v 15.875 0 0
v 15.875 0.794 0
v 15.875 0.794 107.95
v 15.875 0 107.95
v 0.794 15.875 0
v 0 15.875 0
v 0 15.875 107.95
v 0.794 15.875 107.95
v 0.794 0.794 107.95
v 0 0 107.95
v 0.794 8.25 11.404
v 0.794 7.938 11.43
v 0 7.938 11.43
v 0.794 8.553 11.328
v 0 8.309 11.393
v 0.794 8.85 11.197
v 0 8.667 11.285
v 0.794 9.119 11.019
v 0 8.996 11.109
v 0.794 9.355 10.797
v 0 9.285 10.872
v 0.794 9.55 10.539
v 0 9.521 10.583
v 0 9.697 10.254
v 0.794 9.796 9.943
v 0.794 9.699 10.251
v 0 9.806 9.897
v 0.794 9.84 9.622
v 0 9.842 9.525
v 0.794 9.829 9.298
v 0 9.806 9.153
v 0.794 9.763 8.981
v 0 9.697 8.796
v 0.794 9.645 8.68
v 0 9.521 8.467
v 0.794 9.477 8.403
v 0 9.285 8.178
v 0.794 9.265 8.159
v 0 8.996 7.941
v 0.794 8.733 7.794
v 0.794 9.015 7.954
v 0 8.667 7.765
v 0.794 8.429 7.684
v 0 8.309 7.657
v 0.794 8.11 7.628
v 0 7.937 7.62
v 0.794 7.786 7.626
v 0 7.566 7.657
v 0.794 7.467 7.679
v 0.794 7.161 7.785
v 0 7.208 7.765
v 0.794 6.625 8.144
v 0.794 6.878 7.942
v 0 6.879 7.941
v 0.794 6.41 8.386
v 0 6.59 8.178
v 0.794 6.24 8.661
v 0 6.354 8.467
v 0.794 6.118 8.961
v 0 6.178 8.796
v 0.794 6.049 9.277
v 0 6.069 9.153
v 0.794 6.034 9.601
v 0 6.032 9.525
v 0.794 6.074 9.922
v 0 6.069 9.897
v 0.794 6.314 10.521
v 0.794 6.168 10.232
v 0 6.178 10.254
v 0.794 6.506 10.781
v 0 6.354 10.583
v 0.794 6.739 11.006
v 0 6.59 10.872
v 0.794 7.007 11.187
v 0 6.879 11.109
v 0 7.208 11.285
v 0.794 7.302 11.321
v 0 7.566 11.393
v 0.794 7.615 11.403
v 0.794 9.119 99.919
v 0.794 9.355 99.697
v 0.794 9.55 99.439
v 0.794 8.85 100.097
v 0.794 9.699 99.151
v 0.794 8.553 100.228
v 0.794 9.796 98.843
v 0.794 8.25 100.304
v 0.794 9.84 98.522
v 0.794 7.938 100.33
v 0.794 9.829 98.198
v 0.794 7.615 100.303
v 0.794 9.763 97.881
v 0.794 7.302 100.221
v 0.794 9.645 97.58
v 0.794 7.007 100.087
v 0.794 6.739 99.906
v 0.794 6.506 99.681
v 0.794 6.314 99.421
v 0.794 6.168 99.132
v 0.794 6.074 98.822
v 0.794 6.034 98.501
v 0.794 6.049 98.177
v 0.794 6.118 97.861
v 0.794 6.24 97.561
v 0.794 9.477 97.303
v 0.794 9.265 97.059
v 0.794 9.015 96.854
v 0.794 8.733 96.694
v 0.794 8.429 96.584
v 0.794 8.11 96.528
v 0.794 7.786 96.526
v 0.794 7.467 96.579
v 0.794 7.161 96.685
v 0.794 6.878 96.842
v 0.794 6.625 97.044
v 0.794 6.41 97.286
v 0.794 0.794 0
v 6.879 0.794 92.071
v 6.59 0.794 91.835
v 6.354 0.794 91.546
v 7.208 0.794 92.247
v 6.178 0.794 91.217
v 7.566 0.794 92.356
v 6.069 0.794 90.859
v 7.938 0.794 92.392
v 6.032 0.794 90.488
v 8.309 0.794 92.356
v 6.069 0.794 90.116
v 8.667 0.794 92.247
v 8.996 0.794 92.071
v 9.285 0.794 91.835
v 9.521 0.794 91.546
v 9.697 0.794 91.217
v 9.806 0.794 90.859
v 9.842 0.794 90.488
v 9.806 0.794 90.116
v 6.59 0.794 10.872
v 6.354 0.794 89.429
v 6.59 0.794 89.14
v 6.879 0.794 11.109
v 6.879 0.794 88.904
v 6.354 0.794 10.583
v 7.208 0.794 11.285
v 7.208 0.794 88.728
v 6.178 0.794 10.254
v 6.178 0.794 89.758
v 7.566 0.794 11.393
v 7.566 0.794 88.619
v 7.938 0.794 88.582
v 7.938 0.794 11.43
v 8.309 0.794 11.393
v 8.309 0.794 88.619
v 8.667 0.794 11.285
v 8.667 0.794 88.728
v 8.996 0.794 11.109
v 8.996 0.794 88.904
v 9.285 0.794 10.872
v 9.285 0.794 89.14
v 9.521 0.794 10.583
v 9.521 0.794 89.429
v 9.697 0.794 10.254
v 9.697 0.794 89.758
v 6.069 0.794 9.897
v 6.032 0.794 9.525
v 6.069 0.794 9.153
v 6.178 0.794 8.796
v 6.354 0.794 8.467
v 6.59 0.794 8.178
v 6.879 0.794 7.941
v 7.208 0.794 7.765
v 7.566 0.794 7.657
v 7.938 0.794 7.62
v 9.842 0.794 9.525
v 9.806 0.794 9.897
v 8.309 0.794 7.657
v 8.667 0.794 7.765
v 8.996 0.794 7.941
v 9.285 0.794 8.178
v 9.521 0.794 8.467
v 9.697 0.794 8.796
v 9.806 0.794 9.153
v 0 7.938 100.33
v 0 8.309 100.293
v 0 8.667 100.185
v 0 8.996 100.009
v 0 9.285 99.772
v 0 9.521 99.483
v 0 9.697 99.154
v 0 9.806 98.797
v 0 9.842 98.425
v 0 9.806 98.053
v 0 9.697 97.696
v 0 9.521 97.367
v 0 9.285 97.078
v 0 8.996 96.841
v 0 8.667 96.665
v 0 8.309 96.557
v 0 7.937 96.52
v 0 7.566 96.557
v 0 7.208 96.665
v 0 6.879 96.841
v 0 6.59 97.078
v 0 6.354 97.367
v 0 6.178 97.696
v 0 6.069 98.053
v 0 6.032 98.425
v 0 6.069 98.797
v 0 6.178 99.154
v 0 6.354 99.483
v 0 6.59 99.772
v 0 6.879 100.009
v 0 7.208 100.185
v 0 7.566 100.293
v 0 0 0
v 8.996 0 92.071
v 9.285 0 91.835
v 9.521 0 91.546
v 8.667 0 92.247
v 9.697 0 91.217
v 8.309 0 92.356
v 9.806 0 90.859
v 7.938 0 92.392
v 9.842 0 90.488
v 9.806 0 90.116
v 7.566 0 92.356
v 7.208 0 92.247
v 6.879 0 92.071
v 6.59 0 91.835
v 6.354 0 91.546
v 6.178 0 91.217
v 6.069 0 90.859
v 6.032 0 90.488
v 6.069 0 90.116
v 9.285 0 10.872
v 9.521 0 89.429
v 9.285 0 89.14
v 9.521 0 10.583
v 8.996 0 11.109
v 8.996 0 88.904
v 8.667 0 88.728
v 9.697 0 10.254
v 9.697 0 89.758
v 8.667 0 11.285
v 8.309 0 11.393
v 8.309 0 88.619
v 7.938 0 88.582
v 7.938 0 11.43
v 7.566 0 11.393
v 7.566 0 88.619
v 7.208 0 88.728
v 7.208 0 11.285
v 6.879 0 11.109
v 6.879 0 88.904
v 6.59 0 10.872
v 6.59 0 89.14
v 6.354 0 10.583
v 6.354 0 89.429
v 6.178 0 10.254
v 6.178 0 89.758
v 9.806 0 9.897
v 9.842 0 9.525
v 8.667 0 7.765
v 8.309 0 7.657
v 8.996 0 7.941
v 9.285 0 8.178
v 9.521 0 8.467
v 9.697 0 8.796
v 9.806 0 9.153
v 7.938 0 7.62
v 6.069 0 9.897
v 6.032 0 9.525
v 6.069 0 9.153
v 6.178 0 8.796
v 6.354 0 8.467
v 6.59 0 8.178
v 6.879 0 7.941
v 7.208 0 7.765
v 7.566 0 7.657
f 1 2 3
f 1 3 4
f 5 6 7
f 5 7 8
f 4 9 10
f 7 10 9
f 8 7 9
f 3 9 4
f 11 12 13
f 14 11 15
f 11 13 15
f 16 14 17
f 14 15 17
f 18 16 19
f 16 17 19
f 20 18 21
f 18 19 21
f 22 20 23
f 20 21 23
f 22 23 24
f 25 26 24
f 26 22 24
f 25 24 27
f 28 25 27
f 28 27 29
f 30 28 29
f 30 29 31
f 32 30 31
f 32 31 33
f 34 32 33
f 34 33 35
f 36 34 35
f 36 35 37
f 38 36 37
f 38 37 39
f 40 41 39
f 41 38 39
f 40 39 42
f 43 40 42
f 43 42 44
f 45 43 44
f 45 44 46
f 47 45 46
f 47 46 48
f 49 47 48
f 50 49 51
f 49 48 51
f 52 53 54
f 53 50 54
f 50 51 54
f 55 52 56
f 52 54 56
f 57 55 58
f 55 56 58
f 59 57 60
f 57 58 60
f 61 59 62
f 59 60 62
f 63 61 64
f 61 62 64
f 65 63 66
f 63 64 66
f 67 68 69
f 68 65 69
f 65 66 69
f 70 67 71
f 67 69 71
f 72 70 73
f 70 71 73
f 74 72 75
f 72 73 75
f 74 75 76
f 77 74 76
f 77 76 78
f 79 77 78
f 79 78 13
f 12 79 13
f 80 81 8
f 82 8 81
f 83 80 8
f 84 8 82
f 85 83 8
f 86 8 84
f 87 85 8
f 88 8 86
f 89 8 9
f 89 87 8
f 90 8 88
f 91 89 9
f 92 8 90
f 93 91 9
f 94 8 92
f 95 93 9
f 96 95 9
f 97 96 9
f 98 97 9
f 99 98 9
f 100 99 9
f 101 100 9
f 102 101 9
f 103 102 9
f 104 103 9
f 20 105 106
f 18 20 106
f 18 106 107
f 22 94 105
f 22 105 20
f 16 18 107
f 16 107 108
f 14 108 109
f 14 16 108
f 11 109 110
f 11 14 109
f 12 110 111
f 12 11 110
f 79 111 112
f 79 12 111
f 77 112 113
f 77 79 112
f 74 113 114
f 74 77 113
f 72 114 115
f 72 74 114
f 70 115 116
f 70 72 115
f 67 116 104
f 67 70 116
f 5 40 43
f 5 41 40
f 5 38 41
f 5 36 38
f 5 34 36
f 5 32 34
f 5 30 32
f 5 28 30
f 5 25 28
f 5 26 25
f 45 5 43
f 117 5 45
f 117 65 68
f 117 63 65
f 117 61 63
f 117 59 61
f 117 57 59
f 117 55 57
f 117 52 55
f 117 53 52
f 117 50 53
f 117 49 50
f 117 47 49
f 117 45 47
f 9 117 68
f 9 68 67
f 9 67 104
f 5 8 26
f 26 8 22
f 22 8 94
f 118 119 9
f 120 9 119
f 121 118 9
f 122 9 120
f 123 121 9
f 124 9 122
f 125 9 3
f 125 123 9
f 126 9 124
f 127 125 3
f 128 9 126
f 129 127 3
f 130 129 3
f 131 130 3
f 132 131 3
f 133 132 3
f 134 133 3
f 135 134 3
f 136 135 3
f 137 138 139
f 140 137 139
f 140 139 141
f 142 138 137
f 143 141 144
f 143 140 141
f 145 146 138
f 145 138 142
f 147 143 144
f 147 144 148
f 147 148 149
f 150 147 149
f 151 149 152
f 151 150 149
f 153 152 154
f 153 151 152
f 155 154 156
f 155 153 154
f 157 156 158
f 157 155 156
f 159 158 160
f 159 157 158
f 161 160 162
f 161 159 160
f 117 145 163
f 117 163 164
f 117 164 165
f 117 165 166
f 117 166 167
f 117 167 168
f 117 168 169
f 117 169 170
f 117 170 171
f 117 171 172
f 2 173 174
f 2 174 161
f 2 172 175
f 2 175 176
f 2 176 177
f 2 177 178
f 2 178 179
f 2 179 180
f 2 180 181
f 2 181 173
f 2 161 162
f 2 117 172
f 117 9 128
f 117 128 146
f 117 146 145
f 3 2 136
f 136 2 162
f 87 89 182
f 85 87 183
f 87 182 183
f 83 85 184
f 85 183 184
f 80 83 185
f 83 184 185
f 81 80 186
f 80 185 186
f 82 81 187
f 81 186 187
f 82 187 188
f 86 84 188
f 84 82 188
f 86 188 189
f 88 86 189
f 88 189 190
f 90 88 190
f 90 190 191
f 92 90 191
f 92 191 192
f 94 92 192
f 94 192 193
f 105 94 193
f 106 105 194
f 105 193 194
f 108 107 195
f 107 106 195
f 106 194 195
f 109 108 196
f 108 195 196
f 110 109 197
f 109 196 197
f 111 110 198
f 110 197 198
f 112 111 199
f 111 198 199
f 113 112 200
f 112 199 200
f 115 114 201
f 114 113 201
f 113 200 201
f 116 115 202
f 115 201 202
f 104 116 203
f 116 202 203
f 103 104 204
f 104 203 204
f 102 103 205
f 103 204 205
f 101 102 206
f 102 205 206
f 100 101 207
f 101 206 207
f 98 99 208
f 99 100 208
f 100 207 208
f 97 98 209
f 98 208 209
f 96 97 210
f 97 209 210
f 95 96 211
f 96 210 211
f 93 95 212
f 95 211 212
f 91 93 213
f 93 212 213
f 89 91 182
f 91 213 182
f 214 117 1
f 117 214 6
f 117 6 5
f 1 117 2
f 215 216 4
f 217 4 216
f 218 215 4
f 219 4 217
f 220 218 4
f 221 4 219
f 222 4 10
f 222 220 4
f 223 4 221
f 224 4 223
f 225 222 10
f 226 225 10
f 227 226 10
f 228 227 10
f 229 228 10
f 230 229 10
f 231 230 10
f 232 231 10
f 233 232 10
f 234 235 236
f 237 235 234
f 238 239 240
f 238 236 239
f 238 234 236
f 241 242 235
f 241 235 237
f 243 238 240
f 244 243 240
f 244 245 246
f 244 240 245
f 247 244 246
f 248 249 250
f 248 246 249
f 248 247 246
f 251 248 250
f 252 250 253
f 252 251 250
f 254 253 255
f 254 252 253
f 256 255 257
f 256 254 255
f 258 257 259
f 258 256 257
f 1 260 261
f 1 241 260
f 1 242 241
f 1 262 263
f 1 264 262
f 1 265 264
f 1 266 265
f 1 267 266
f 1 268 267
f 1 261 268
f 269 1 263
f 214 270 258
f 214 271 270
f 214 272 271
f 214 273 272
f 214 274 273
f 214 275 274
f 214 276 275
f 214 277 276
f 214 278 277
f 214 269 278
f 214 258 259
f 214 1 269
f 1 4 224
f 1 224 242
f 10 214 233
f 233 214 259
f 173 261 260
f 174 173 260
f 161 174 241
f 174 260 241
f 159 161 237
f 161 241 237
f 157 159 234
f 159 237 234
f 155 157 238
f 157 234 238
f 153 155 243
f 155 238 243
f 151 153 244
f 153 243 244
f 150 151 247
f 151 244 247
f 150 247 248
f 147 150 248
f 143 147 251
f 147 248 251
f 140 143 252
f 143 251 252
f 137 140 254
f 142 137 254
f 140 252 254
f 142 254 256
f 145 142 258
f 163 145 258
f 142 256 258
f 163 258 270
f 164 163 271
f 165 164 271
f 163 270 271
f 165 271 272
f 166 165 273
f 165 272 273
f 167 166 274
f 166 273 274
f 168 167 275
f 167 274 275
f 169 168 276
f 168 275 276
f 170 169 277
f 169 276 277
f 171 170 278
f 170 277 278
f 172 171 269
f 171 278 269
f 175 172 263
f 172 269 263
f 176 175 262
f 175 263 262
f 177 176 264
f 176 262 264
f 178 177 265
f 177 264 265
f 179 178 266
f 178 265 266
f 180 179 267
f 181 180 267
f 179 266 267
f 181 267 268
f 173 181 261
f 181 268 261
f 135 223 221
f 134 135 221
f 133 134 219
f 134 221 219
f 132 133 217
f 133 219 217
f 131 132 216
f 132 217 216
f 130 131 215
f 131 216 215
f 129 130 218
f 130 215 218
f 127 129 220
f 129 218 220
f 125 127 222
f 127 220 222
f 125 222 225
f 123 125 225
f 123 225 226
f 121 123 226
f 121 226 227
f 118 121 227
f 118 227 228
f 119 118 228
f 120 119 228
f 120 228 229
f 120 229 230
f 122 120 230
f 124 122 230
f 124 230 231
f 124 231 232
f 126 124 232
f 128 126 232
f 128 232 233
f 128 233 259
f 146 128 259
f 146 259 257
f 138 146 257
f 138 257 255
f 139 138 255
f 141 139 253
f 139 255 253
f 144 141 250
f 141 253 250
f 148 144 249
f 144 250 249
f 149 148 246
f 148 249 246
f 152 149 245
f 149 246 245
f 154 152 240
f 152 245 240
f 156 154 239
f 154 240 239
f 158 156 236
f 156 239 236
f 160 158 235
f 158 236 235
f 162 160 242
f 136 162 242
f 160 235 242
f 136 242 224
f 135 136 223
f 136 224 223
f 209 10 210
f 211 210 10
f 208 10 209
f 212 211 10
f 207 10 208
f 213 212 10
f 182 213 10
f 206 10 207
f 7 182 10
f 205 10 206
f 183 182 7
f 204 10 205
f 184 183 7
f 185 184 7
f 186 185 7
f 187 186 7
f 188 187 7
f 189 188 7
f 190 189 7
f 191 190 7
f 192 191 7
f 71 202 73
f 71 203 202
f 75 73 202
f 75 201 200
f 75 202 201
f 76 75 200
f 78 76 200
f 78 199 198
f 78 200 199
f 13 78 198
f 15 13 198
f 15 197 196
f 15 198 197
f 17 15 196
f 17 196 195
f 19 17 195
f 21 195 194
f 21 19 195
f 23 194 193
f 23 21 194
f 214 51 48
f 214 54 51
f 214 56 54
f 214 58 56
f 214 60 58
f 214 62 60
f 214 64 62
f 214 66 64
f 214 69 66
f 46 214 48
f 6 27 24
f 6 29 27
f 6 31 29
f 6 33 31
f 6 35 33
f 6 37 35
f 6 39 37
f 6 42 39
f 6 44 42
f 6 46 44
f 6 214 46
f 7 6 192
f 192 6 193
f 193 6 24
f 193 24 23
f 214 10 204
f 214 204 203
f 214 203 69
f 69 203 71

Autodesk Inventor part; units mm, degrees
ref_plane "YZ Plane" through (0, 0, 0) normal (1, 0, 0) x (0, 1, 0)
ref_plane "XZ Plane" through (0, 0, 0) normal (0, 1, 0) x (-1, 0, 0)
ref_plane "XY Plane" through (0, 0, 0) normal (0, 0, 1) x (1, 0, 0)
sketch "Sketch1" plane through (0, 0, 0) normal (0, 0, 1) x (1, 0, 0)
  line L0 (0, 0) -> (0, 15.875)
  line L1 (0, 15.875) -> (0.7937, 15.875)
  line L2 (0.7937, 15.875) -> (0.7938, 0.7937)
  line L3 (0.7938, 0.7937) -> (15.875, 0.7937)
  line L4 (15.875, 0.7937) -> (15.875, 0)
  line L5 (15.875, 0) -> (0, 0)
  dimension "d0" = 15.875
  dimension "d1" = 0.7937
extrude "Extrusion1" add sketch "Sketch1" along normal blind 107.95
sketch "Sketch2" plane through (0, 0, 0) normal (0, -1, 0) x (1, 0, 0)
  line L0 (15.875, 0) -> (0, 0) projected
  line L1 (0, 107.95) -> (15.875, 107.95) projected
  line L2 (7.9375, 107.95) -> (7.9375, 0) construction
  circle A0 centre (7.9375, 90.4875) radius 1.905
  circle A1 centre (7.9375, 9.525) radius 1.905
  line L3 (257.175, 98.425) -> (-9.525, 98.425) construction
  line L4 (-15.875, 82.55) -> (187.325, 82.55) construction
  dimension "d4" = 3.81
  dimension "d6" = 17.4625
  dimension "d7" = 9.525
  dimension "d16" = 15.875
  dimension "d17" = 9.525
extrude "Extrusion2" cut sketch "Sketch2" against normal through all
sketch "Sketch3" plane through (0, 0, 0) normal (-1, 0, 0) x (0, 0, 1)
  line L0 (0, 0) -> (0, 15.875) projected
  line L1 (107.95, 15.875) -> (107.95, 0) projected
  line L2 (0, 7.9375) -> (107.95, 7.9375) construction
  circle A0 centre (9.525, 7.9375) radius 1.905
  circle A1 centre (98.425, 7.9375) radius 1.905
  dimension "d11" = 3.81
  dimension "d12" = 9.525
  dimension "d13" = 9.525
extrude "Extrusion3" cut sketch "Sketch3" against normal through all
equation "\"d6\" = d17 + 0.5 * d16"
properties part number "Hopper Bracing P2" material "Aluminum 6061"
